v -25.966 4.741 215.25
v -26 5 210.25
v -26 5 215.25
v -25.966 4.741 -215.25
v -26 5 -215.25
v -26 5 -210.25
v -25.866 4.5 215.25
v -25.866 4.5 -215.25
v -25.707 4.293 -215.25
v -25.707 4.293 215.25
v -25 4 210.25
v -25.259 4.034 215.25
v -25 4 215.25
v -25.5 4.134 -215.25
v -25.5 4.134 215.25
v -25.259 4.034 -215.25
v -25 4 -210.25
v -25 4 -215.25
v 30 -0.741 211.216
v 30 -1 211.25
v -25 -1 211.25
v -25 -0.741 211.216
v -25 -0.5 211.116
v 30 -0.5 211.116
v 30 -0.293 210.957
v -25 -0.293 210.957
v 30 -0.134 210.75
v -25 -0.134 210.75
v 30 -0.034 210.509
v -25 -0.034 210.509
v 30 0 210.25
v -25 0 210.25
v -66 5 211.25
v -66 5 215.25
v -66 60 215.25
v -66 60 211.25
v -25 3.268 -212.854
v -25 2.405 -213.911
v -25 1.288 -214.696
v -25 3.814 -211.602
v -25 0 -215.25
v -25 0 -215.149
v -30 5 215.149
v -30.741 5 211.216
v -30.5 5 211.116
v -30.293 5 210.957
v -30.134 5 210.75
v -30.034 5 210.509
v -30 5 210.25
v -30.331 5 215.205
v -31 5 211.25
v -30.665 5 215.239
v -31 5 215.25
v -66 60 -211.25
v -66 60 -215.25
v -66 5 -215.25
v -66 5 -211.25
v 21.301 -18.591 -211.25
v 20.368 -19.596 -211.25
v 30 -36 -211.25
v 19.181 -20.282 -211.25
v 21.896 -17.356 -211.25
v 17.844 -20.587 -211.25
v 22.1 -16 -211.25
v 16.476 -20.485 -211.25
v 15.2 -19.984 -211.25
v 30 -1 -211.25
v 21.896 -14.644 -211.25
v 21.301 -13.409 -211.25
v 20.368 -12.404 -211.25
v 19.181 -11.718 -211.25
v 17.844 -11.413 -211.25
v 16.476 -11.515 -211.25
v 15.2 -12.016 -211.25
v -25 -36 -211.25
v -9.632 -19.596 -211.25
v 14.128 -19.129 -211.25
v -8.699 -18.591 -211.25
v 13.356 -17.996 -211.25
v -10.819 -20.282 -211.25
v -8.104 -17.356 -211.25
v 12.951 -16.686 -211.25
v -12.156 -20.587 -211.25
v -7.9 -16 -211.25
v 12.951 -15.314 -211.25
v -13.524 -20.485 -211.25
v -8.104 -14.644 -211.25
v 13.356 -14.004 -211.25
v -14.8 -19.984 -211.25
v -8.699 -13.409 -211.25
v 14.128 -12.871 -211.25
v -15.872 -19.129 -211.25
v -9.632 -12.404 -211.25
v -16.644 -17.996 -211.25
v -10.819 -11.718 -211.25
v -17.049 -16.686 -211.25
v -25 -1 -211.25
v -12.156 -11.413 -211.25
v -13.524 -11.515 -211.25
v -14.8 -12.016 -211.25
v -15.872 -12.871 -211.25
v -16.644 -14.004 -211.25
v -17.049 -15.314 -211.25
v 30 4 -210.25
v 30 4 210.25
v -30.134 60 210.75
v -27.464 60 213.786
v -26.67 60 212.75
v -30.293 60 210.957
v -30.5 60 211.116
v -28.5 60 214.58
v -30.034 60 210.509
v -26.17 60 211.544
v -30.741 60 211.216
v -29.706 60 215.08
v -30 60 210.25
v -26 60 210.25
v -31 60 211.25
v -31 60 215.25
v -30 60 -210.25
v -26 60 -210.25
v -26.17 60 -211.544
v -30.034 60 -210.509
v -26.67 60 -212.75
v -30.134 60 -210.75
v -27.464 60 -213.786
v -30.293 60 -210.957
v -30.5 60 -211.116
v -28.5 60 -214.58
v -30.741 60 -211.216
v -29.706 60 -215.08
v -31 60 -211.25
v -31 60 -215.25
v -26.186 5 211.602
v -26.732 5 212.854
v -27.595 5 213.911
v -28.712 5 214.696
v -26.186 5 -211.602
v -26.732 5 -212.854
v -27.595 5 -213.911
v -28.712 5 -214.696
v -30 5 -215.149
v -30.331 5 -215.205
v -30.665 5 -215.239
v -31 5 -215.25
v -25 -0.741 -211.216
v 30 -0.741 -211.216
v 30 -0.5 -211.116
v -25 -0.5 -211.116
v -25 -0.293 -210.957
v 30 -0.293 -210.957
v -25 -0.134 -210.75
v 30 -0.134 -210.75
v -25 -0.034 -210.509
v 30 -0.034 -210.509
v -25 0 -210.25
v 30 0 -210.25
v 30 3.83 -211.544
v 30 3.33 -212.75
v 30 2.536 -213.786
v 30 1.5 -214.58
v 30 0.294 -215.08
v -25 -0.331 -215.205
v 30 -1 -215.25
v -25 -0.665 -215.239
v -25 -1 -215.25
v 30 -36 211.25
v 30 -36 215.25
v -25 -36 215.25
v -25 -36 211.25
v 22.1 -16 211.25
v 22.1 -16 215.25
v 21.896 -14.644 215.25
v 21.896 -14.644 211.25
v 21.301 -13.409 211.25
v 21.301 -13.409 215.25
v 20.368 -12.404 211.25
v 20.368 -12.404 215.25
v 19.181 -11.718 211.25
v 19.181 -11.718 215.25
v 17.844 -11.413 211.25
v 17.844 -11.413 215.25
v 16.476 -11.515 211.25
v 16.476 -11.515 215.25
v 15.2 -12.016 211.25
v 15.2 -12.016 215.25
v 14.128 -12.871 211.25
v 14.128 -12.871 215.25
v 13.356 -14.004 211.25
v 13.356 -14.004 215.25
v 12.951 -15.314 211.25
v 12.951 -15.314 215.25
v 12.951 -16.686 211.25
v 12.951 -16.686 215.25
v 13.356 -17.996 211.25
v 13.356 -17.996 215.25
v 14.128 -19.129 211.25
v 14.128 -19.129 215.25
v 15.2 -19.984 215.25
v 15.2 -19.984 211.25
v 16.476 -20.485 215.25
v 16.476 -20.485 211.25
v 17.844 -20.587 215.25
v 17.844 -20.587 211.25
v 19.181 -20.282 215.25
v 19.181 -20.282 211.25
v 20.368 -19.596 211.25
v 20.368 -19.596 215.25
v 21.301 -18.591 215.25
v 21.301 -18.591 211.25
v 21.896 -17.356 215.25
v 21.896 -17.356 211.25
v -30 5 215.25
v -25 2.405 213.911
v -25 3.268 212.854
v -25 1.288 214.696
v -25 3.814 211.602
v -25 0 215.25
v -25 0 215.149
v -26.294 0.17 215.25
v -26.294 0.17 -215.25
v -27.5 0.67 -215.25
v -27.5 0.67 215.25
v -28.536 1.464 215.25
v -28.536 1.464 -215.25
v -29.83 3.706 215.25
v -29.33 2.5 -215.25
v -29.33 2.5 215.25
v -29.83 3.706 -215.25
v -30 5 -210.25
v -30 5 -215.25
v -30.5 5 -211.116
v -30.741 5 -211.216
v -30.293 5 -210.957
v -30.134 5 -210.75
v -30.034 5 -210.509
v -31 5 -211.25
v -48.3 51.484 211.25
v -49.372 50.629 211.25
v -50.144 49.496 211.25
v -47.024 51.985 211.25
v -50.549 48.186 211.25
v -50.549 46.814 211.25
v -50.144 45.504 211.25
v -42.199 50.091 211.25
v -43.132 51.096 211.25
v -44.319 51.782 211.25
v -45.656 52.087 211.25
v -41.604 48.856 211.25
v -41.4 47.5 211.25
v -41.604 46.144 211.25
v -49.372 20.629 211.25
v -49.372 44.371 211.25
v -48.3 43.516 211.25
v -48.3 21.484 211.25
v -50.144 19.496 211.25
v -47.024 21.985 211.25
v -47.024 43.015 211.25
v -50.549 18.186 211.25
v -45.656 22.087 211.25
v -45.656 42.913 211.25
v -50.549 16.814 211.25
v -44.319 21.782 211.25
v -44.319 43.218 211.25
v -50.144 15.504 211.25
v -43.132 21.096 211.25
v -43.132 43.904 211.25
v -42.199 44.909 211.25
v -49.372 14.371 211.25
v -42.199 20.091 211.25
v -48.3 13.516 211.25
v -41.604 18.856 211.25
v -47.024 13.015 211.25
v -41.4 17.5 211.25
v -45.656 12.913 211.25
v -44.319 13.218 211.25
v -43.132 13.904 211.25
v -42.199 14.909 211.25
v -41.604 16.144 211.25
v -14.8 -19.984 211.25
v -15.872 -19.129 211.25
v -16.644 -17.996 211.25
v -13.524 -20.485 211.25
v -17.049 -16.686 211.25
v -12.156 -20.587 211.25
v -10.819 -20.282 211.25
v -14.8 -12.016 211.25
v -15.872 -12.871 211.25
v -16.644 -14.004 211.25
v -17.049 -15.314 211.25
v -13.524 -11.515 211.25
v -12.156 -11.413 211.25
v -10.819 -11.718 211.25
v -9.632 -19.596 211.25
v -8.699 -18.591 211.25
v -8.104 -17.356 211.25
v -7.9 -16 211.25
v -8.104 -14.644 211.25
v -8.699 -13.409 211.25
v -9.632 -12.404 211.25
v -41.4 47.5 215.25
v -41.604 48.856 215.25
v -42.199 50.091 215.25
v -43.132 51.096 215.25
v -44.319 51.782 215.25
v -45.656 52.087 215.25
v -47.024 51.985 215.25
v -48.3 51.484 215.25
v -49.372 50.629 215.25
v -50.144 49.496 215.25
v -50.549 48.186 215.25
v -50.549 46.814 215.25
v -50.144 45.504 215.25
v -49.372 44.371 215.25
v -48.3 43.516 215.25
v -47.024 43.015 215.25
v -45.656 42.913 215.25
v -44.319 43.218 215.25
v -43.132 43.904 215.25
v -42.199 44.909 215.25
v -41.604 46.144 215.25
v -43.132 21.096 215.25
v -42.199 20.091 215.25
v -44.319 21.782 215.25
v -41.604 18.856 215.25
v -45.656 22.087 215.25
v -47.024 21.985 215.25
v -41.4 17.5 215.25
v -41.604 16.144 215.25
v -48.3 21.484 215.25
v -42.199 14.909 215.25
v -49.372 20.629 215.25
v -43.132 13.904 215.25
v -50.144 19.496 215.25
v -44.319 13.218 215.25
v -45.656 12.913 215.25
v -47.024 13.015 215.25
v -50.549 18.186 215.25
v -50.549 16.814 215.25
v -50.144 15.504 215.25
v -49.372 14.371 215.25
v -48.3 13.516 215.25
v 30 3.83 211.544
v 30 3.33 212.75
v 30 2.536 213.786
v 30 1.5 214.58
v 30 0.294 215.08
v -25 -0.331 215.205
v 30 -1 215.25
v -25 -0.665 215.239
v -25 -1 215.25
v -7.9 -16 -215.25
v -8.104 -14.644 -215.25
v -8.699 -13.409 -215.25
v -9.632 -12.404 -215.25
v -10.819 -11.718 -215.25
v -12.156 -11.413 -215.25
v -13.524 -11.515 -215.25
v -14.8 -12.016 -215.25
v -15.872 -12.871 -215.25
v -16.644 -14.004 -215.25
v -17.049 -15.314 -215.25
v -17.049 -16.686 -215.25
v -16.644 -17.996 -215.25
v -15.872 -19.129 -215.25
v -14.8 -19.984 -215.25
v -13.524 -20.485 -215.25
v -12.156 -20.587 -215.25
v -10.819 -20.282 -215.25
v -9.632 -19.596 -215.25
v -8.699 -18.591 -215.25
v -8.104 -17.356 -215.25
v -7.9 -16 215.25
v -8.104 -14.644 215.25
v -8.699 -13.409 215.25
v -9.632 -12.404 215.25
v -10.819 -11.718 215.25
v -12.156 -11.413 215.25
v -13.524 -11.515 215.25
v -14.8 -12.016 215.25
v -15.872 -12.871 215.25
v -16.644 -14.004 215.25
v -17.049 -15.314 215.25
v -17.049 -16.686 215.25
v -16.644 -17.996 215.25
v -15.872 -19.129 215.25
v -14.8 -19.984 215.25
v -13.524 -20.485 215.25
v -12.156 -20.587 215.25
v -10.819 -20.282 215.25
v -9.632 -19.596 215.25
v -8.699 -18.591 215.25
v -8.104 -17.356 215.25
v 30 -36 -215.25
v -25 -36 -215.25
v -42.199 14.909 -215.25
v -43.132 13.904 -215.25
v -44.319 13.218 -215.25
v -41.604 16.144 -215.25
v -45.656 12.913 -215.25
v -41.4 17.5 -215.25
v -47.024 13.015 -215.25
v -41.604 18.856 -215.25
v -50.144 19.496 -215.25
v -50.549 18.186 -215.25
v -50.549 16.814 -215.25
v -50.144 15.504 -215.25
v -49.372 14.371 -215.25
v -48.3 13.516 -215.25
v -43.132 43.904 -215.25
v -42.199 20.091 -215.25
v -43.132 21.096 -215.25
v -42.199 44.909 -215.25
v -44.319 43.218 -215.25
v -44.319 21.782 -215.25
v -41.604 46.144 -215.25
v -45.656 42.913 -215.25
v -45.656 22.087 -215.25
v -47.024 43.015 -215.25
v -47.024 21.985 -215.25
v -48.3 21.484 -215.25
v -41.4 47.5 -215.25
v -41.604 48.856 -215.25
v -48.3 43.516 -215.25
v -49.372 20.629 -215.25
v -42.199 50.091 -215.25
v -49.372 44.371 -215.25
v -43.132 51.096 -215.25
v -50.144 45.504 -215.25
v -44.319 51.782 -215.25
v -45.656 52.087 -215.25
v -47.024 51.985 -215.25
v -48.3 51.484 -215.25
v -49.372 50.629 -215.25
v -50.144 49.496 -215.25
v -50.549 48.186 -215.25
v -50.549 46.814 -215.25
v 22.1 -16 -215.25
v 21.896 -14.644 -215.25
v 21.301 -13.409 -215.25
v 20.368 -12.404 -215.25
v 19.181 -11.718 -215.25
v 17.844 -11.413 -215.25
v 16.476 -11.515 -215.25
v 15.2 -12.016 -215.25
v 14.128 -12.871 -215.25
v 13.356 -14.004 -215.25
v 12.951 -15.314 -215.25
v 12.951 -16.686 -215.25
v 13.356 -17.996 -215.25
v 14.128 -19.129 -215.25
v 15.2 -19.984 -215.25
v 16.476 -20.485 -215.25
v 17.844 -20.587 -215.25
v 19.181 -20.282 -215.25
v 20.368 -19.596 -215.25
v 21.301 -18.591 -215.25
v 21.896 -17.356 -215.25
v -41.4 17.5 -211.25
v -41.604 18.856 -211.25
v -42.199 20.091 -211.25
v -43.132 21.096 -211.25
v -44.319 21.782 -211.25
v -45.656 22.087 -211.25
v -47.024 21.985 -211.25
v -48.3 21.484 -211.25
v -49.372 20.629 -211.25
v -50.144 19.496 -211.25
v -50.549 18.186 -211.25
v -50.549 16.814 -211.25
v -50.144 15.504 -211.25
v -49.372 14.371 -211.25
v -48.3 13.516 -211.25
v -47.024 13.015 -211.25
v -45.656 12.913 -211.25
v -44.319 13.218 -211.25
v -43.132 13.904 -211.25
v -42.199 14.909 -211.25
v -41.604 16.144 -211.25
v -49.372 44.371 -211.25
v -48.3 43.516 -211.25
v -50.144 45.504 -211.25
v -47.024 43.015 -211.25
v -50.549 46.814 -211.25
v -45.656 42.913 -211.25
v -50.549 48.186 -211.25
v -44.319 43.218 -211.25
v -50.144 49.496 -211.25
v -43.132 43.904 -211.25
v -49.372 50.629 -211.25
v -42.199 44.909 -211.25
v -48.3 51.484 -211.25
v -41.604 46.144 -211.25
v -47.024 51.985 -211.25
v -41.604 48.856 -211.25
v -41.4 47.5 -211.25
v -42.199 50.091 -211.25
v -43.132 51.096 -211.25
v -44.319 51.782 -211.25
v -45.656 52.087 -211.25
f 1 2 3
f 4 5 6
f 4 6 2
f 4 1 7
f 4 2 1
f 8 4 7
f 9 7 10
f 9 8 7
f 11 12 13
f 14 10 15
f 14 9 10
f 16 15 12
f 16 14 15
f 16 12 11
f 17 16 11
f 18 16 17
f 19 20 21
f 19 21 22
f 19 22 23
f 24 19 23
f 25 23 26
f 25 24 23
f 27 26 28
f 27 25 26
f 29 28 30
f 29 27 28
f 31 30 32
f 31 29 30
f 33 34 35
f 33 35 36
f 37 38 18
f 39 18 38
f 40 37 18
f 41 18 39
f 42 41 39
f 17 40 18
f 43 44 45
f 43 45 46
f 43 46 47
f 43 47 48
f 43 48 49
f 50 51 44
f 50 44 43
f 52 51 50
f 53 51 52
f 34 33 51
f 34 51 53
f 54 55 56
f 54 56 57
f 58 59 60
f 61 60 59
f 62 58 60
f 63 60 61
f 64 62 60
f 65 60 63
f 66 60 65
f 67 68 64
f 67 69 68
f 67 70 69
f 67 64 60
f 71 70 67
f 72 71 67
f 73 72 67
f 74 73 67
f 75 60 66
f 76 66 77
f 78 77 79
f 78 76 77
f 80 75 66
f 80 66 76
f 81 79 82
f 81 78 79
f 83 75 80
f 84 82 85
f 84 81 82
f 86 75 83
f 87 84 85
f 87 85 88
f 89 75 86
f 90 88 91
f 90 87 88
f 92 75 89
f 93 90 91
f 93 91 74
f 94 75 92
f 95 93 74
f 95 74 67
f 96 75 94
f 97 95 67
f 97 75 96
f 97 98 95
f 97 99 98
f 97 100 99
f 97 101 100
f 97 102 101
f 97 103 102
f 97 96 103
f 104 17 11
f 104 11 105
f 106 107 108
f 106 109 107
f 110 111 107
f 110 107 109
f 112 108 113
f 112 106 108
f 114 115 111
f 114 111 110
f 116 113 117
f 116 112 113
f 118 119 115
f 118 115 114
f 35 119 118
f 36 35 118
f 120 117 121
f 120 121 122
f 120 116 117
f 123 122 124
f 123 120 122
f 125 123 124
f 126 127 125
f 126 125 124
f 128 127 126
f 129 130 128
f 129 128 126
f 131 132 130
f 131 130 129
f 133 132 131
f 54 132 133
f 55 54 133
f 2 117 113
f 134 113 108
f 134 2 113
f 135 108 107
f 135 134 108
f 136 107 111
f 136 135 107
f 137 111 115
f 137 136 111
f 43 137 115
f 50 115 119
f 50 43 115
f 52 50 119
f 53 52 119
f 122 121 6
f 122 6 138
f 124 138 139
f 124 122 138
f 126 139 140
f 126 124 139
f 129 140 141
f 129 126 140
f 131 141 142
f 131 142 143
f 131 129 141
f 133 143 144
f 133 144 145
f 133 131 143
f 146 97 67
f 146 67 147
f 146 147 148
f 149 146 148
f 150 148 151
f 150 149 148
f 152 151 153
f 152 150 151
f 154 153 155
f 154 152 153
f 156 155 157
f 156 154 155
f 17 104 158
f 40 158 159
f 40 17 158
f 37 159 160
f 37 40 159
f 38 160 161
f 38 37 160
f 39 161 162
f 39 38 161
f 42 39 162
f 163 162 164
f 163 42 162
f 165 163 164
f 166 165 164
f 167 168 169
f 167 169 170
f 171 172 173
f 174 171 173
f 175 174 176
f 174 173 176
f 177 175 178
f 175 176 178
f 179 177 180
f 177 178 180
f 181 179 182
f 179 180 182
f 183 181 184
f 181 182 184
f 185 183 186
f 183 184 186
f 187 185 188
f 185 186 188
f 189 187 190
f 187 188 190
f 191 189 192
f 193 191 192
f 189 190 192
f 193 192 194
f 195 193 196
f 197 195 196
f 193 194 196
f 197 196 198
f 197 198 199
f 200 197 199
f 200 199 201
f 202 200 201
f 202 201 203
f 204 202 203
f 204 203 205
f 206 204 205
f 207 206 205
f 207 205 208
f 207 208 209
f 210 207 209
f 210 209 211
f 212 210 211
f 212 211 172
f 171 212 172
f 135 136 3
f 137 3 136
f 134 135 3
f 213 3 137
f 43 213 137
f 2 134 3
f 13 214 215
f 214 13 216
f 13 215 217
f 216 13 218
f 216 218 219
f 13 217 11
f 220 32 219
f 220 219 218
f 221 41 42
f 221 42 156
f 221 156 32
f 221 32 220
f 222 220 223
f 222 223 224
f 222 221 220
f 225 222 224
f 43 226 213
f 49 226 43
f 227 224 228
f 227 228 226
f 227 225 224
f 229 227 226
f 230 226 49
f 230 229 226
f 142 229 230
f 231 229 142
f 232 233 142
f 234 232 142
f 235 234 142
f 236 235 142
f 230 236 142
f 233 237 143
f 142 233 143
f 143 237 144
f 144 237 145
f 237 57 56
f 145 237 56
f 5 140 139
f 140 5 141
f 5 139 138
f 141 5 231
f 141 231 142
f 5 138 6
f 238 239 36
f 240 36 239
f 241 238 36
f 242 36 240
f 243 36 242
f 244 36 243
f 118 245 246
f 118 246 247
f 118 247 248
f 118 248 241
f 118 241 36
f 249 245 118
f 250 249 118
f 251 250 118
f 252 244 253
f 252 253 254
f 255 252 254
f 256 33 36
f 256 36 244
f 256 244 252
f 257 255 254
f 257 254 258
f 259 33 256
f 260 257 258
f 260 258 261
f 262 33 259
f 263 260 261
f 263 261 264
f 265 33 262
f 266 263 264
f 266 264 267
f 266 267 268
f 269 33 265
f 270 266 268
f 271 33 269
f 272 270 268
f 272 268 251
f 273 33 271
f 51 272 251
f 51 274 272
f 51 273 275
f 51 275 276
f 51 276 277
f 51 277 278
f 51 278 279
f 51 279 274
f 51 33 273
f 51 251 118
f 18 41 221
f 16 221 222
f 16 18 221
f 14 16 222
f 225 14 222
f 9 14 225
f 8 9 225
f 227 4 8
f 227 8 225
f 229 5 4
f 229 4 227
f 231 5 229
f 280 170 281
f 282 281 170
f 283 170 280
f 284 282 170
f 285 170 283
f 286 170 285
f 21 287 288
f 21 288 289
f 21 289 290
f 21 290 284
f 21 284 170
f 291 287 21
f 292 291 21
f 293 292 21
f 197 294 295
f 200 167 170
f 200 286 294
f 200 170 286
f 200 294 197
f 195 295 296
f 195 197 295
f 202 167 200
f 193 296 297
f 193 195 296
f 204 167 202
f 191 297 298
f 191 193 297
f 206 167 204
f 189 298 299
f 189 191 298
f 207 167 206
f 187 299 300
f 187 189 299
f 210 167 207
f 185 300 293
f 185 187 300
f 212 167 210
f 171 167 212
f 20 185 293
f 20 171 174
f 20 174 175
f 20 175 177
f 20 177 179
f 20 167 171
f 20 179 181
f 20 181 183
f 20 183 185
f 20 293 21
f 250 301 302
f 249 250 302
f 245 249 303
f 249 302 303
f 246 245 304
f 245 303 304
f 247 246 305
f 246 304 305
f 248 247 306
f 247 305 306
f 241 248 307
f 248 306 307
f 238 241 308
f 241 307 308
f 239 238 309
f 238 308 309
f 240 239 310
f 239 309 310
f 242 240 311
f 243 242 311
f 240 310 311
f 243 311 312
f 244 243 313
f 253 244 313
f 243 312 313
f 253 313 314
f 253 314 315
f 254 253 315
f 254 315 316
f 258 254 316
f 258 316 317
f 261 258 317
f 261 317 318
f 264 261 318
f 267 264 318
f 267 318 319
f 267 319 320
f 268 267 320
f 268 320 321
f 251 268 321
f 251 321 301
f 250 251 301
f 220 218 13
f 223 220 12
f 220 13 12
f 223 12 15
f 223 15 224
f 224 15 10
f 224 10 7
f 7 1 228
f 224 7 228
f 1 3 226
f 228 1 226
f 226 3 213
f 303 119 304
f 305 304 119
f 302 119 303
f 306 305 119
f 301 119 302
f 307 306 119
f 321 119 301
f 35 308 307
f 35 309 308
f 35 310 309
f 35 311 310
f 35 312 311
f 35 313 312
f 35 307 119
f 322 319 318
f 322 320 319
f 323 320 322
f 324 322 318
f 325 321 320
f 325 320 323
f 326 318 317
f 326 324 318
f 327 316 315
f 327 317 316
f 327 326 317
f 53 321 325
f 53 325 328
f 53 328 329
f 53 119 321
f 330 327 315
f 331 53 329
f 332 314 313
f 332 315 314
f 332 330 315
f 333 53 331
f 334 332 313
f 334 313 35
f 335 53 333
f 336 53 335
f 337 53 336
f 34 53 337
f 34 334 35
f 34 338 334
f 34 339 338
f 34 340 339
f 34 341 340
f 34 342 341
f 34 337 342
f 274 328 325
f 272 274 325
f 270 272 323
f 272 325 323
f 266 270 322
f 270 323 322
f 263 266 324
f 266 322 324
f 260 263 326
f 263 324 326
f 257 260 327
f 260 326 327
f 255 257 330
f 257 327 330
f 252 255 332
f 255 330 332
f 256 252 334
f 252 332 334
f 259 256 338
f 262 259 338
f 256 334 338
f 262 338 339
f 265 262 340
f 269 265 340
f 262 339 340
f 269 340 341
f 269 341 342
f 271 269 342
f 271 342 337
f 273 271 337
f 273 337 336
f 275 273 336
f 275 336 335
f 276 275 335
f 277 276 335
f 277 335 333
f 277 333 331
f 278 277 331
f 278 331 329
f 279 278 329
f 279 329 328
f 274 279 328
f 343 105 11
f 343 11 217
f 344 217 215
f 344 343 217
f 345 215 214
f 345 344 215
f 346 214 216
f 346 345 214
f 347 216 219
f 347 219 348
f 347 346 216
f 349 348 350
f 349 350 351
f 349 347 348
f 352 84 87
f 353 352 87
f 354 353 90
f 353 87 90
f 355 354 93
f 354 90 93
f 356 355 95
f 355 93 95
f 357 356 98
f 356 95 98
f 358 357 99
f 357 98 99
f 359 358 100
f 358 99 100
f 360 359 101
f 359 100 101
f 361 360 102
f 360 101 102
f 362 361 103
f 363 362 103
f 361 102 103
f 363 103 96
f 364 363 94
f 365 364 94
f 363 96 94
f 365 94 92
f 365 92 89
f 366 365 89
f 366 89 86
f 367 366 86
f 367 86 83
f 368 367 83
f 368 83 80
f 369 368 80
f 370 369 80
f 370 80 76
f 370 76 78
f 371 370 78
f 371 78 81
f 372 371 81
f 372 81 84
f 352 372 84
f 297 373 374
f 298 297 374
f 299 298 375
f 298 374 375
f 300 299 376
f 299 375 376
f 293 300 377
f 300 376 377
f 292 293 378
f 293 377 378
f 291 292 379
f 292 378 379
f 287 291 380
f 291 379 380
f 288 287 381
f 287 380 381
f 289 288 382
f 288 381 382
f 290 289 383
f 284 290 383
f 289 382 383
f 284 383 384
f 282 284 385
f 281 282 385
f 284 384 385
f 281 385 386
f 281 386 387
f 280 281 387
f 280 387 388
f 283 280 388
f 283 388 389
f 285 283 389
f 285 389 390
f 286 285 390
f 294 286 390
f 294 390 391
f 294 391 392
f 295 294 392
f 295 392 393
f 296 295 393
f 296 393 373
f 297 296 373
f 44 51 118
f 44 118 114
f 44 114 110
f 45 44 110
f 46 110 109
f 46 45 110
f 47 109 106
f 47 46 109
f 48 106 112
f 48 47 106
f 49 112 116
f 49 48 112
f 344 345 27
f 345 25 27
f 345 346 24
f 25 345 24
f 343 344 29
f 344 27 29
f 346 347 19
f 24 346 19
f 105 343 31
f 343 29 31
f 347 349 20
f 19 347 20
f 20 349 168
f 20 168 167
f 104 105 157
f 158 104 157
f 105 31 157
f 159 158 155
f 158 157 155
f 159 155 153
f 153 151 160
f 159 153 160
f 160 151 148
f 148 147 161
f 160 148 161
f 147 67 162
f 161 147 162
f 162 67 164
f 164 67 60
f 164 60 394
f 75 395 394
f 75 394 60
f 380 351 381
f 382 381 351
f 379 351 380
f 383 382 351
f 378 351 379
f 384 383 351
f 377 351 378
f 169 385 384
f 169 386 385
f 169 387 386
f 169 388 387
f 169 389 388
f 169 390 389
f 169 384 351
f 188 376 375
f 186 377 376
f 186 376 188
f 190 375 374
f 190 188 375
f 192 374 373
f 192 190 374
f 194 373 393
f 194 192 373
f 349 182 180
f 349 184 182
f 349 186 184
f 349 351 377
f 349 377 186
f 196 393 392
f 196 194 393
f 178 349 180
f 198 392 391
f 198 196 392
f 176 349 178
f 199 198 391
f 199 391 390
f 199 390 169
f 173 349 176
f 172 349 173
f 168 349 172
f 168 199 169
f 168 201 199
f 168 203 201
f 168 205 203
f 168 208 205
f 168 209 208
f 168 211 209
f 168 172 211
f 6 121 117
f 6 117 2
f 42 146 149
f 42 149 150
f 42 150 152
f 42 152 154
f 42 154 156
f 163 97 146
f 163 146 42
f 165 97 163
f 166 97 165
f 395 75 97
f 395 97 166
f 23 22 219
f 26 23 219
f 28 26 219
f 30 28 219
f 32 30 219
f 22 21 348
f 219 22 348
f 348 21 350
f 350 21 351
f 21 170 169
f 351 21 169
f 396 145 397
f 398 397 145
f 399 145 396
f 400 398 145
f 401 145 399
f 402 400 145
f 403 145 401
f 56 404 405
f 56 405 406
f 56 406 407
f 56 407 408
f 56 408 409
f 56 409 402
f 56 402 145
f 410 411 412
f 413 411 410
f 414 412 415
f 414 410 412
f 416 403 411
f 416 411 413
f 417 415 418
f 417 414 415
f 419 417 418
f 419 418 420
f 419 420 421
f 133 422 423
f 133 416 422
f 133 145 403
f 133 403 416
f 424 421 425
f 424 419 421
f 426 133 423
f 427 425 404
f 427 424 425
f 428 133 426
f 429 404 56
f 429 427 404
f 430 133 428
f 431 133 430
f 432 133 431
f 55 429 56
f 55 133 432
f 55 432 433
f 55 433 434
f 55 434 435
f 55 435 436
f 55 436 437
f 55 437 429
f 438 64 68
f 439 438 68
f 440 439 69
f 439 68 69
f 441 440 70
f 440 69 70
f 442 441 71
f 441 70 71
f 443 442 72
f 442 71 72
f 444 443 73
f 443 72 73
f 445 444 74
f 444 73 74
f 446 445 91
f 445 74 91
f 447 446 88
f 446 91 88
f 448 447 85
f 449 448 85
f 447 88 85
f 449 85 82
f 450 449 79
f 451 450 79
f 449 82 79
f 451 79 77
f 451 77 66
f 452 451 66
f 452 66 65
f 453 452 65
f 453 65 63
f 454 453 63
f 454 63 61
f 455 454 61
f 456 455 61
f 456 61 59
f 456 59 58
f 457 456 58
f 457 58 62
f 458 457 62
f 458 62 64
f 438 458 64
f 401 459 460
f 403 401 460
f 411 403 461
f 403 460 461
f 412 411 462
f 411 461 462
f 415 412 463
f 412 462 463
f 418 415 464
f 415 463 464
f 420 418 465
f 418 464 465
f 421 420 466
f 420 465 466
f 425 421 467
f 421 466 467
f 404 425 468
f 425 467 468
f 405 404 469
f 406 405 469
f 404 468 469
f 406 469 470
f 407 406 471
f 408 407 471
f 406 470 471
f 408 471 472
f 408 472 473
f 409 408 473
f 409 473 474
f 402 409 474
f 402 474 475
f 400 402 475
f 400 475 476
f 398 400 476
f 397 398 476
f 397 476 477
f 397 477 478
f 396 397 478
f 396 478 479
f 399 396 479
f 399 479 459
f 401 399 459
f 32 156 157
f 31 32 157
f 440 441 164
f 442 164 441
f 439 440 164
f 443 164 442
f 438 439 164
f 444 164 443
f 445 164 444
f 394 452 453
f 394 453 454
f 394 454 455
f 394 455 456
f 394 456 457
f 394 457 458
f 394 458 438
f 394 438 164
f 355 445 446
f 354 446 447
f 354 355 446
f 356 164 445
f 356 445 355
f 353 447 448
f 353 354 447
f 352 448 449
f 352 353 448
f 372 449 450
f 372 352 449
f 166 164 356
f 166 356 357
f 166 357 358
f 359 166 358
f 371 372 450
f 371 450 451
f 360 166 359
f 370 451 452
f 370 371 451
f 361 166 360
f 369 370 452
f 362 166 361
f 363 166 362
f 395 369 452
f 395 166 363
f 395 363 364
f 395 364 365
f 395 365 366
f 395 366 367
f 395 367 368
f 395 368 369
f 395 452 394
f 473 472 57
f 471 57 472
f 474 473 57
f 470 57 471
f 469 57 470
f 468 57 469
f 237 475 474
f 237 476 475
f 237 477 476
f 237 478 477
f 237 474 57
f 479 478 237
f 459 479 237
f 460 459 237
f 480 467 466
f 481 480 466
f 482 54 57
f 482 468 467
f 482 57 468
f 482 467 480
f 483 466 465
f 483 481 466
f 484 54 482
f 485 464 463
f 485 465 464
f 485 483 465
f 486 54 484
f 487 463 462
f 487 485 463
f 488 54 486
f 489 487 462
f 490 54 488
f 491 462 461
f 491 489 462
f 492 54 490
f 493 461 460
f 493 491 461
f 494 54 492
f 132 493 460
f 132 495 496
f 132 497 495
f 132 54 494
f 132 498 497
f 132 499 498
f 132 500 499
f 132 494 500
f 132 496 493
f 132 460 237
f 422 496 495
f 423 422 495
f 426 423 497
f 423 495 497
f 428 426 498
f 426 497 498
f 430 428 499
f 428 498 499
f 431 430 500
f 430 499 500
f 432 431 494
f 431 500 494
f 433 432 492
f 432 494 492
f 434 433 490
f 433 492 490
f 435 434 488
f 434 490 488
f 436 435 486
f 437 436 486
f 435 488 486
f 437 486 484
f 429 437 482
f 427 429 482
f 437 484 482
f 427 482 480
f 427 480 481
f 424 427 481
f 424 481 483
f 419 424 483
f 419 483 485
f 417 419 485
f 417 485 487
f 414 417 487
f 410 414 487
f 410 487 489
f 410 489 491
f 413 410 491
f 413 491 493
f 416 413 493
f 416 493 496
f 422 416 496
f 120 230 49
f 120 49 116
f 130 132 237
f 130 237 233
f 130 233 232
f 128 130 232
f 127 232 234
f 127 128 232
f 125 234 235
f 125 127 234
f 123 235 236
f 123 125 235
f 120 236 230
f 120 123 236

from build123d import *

# Parameters (mm, degrees)
SKETCH1_W                      = 60
SKETCH1_H                      = 430.5
BASE_FLANGE1_DEPTH             = 4
EDGE_FLANGE1_STRIP_W           = 18
EDGE_FLANGE1_STRIP_H           = 4
EDGE_FLANGE1_STRIP_CUT_DEPTH   = 430.5
EDGE_FLANGE1_DEPTH             = 430.5
EDGE_FLANGE2_STRIP_W           = 18
EDGE_FLANGE2_STRIP_H           = 4
EDGE_FLANGE2_STRIP_CUT_DEPTH   = 55
EDGE_FLANGE2_STRIP_2_W         = 18
EDGE_FLANGE2_STRIP_2_H         = 4
EDGE_FLANGE2_STRIP_CUT_2_DEPTH = 55
EDGE_FLANGE2_STRIP_3_W         = 18
EDGE_FLANGE2_STRIP_3_H         = 4
EDGE_FLANGE2_STRIP_CUT_3_DEPTH = 55
EDGE_FLANGE2_STRIP_4_W         = 18
EDGE_FLANGE2_STRIP_4_H         = 4
EDGE_FLANGE2_STRIP_CUT_4_DEPTH = 55
EDGE_FLANGE2_DEPTH             = 55
EDGE_FLANGE2_BEND_DEPTH        = 55
EDGE_FLANGE2_BEND_2_DEPTH      = 55
EDGE_FLANGE2_BEND_3_DEPTH      = 55
SKETCH18_R                     = 4.6
EXTRUDE1_DEPTH                 = 440.643321341


# Sheet-metal steps are written as plain solids
with BuildPart() as part:
    # Sketch1 → Base-Flange1 (new body)
    with BuildSketch(Plane(origin=(0, 0, 0), x_dir=(1, 0, 0), z_dir=(0, 1, 0))):
        Rectangle(SKETCH1_W, SKETCH1_H)
    extrude(amount=BASE_FLANGE1_DEPTH)

    # Edge-Flange1 strip (across the edge) → Edge-Flange1 strip cut (cut)
    with BuildSketch(Plane(origin=(-30, 4, -215.25), x_dir=(1, 0, 0), z_dir=(0, 0, 1))):
        with Locations((-4, -2)):
            Rectangle(EDGE_FLANGE1_STRIP_W, EDGE_FLANGE1_STRIP_H)
    extrude(amount=EDGE_FLANGE1_STRIP_CUT_DEPTH, mode=Mode.SUBTRACT)

    # Edge-Flange1 section (across the edge) → Edge-Flange1 (add)
    with BuildSketch(Plane(origin=(-30, 4, -215.25), x_dir=(1, 0, 0), z_dir=(0, 0, 1))):
        with BuildLine():
            Line((0, 1), (0, 56))
            Line((0, 56), (4, 56))
            Line((4, 56), (4, 1))
            ThreePointArc((4, 1), (4.292893219, 0.292893219), (5, 0))
            Line((5, 0), (5, -4))
            ThreePointArc((5, -4), (1.464466094, -2.535533906), (0, 1))
        make_face()
    extrude(amount=EDGE_FLANGE1_DEPTH)

    # Edge-Flange2 strip (across the edge) → Edge-Flange2 strip cut (cut)
    with BuildSketch(Plane(origin=(-30, 5, 215.25), x_dir=(0, 0, -1), z_dir=(0, 1, 0))):
        with Locations((-4, -2)):
            Rectangle(EDGE_FLANGE2_STRIP_W, EDGE_FLANGE2_STRIP_H)
    extrude(amount=EDGE_FLANGE2_STRIP_CUT_DEPTH, mode=Mode.SUBTRACT)

    # Edge-Flange2 strip 2 (across the edge) → Edge-Flange2 strip cut 2 (cut)
    with BuildSketch(Plane(origin=(30, 0, 215.25), x_dir=(0, 0, -1), z_dir=(-1, 0, 0))):
        with Locations((-4, -2)):
            Rectangle(EDGE_FLANGE2_STRIP_2_W, EDGE_FLANGE2_STRIP_2_H)
    extrude(amount=EDGE_FLANGE2_STRIP_CUT_2_DEPTH, mode=Mode.SUBTRACT)

    # Edge-Flange2 strip 3 (across the edge) → Edge-Flange2 strip cut 3 (cut)
    with BuildSketch(Plane(origin=(-30, 60, -215.25), x_dir=(0, 0, 1), z_dir=(0, -1, 0))):
        with Locations((-4, -2)):
            Rectangle(EDGE_FLANGE2_STRIP_3_W, EDGE_FLANGE2_STRIP_3_H)
    extrude(amount=EDGE_FLANGE2_STRIP_CUT_3_DEPTH, mode=Mode.SUBTRACT)

    # Edge-Flange2 strip 4 (across the edge) → Edge-Flange2 strip cut 4 (cut)
    with BuildSketch(Plane(origin=(-25, 0, -215.25), x_dir=(0, 0, 1), z_dir=(1, 0, 0))):
        with Locations((-4, -2)):
            Rectangle(EDGE_FLANGE2_STRIP_4_W, EDGE_FLANGE2_STRIP_4_H)
    extrude(amount=EDGE_FLANGE2_STRIP_CUT_4_DEPTH, mode=Mode.SUBTRACT)

    # Edge-Flange2 section (across the edge) → Edge-Flange2 (add)
    with BuildSketch(Plane(origin=(-30, 5, 215.25), x_dir=(0, 0, -1), z_dir=(0, 1, 0))):
        with BuildLine():
            Line((0, 1), (0, 36))
            Line((0, 36), (4, 36))
            Line((4, 36), (4, 1))
            ThreePointArc((4, 1), (4.292893219, 0.292893219), (5, 0))
            Line((5, 0), (5, -4))
            ThreePointArc((5, -4), (1.464466094, -2.535533906), (0, 1))
        make_face()
    extrude(amount=EDGE_FLANGE2_DEPTH)

    # Edge-Flange2 section 2 (across the edge) → Edge-Flange2 bend (add)
    with BuildSketch(Plane(origin=(30, 0, 215.25), x_dir=(0, 0, -1), z_dir=(-1, 0, 0))):
        with BuildLine():
            Line((0, 1), (0, 36))
            Line((0, 36), (4, 36))
            Line((4, 36), (4, 1))
            ThreePointArc((4, 1), (4.292893219, 0.292893219), (5, 0))
            Line((5, 0), (5, -4))
            ThreePointArc((5, -4), (1.464466094, -2.535533906), (0, 1))
        make_face()
    extrude(amount=EDGE_FLANGE2_BEND_DEPTH)

    # Edge-Flange2 section 3 (across the edge) → Edge-Flange2 bend 2 (add)
    with BuildSketch(Plane(origin=(-30, 60, -215.25), x_dir=(0, 0, 1), z_dir=(0, -1, 0))):
        with BuildLine():
            Line((0, 1), (0, 36))
            Line((0, 36), (4, 36))
            Line((4, 36), (4, 1))
            ThreePointArc((4, 1), (4.292893219, 0.292893219), (5, 0))
            Line((5, 0), (5, -4))
            ThreePointArc((5, -4), (1.464466094, -2.535533906), (0, 1))
        make_face()
    extrude(amount=EDGE_FLANGE2_BEND_2_DEPTH)

    # Edge-Flange2 section 4 (across the edge) → Edge-Flange2 bend 3 (add)
    with BuildSketch(Plane(origin=(-25, 0, -215.25), x_dir=(0, 0, 1), z_dir=(1, 0, 0))):
        with BuildLine():
            Line((0, 1), (0, 36))
            Line((0, 36), (4, 36))
            Line((4, 36), (4, 1))
            ThreePointArc((4, 1), (4.292893219, 0.292893219), (5, 0))
            Line((5, 0), (5, -4))
            ThreePointArc((5, -4), (1.464466094, -2.535533906), (0, 1))
        make_face()
    extrude(amount=EDGE_FLANGE2_BEND_3_DEPTH)

    # Sketch18 → Extrude1 (cut, through all)
    with BuildSketch(Plane.XY.offset(215.25)):
        with Locations((-46, 47.5)):
            Circle(SKETCH18_R)
        with Locations((-46, 17.5)):
            Circle(SKETCH18_R)
        with Locations((-12.5, -16)):
            Circle(SKETCH18_R)
        with Locations((17.5, -16)):
            Circle(SKETCH18_R)
    extrude(amount=-EXTRUDE1_DEPTH, mode=Mode.SUBTRACT)


solid = part.part
